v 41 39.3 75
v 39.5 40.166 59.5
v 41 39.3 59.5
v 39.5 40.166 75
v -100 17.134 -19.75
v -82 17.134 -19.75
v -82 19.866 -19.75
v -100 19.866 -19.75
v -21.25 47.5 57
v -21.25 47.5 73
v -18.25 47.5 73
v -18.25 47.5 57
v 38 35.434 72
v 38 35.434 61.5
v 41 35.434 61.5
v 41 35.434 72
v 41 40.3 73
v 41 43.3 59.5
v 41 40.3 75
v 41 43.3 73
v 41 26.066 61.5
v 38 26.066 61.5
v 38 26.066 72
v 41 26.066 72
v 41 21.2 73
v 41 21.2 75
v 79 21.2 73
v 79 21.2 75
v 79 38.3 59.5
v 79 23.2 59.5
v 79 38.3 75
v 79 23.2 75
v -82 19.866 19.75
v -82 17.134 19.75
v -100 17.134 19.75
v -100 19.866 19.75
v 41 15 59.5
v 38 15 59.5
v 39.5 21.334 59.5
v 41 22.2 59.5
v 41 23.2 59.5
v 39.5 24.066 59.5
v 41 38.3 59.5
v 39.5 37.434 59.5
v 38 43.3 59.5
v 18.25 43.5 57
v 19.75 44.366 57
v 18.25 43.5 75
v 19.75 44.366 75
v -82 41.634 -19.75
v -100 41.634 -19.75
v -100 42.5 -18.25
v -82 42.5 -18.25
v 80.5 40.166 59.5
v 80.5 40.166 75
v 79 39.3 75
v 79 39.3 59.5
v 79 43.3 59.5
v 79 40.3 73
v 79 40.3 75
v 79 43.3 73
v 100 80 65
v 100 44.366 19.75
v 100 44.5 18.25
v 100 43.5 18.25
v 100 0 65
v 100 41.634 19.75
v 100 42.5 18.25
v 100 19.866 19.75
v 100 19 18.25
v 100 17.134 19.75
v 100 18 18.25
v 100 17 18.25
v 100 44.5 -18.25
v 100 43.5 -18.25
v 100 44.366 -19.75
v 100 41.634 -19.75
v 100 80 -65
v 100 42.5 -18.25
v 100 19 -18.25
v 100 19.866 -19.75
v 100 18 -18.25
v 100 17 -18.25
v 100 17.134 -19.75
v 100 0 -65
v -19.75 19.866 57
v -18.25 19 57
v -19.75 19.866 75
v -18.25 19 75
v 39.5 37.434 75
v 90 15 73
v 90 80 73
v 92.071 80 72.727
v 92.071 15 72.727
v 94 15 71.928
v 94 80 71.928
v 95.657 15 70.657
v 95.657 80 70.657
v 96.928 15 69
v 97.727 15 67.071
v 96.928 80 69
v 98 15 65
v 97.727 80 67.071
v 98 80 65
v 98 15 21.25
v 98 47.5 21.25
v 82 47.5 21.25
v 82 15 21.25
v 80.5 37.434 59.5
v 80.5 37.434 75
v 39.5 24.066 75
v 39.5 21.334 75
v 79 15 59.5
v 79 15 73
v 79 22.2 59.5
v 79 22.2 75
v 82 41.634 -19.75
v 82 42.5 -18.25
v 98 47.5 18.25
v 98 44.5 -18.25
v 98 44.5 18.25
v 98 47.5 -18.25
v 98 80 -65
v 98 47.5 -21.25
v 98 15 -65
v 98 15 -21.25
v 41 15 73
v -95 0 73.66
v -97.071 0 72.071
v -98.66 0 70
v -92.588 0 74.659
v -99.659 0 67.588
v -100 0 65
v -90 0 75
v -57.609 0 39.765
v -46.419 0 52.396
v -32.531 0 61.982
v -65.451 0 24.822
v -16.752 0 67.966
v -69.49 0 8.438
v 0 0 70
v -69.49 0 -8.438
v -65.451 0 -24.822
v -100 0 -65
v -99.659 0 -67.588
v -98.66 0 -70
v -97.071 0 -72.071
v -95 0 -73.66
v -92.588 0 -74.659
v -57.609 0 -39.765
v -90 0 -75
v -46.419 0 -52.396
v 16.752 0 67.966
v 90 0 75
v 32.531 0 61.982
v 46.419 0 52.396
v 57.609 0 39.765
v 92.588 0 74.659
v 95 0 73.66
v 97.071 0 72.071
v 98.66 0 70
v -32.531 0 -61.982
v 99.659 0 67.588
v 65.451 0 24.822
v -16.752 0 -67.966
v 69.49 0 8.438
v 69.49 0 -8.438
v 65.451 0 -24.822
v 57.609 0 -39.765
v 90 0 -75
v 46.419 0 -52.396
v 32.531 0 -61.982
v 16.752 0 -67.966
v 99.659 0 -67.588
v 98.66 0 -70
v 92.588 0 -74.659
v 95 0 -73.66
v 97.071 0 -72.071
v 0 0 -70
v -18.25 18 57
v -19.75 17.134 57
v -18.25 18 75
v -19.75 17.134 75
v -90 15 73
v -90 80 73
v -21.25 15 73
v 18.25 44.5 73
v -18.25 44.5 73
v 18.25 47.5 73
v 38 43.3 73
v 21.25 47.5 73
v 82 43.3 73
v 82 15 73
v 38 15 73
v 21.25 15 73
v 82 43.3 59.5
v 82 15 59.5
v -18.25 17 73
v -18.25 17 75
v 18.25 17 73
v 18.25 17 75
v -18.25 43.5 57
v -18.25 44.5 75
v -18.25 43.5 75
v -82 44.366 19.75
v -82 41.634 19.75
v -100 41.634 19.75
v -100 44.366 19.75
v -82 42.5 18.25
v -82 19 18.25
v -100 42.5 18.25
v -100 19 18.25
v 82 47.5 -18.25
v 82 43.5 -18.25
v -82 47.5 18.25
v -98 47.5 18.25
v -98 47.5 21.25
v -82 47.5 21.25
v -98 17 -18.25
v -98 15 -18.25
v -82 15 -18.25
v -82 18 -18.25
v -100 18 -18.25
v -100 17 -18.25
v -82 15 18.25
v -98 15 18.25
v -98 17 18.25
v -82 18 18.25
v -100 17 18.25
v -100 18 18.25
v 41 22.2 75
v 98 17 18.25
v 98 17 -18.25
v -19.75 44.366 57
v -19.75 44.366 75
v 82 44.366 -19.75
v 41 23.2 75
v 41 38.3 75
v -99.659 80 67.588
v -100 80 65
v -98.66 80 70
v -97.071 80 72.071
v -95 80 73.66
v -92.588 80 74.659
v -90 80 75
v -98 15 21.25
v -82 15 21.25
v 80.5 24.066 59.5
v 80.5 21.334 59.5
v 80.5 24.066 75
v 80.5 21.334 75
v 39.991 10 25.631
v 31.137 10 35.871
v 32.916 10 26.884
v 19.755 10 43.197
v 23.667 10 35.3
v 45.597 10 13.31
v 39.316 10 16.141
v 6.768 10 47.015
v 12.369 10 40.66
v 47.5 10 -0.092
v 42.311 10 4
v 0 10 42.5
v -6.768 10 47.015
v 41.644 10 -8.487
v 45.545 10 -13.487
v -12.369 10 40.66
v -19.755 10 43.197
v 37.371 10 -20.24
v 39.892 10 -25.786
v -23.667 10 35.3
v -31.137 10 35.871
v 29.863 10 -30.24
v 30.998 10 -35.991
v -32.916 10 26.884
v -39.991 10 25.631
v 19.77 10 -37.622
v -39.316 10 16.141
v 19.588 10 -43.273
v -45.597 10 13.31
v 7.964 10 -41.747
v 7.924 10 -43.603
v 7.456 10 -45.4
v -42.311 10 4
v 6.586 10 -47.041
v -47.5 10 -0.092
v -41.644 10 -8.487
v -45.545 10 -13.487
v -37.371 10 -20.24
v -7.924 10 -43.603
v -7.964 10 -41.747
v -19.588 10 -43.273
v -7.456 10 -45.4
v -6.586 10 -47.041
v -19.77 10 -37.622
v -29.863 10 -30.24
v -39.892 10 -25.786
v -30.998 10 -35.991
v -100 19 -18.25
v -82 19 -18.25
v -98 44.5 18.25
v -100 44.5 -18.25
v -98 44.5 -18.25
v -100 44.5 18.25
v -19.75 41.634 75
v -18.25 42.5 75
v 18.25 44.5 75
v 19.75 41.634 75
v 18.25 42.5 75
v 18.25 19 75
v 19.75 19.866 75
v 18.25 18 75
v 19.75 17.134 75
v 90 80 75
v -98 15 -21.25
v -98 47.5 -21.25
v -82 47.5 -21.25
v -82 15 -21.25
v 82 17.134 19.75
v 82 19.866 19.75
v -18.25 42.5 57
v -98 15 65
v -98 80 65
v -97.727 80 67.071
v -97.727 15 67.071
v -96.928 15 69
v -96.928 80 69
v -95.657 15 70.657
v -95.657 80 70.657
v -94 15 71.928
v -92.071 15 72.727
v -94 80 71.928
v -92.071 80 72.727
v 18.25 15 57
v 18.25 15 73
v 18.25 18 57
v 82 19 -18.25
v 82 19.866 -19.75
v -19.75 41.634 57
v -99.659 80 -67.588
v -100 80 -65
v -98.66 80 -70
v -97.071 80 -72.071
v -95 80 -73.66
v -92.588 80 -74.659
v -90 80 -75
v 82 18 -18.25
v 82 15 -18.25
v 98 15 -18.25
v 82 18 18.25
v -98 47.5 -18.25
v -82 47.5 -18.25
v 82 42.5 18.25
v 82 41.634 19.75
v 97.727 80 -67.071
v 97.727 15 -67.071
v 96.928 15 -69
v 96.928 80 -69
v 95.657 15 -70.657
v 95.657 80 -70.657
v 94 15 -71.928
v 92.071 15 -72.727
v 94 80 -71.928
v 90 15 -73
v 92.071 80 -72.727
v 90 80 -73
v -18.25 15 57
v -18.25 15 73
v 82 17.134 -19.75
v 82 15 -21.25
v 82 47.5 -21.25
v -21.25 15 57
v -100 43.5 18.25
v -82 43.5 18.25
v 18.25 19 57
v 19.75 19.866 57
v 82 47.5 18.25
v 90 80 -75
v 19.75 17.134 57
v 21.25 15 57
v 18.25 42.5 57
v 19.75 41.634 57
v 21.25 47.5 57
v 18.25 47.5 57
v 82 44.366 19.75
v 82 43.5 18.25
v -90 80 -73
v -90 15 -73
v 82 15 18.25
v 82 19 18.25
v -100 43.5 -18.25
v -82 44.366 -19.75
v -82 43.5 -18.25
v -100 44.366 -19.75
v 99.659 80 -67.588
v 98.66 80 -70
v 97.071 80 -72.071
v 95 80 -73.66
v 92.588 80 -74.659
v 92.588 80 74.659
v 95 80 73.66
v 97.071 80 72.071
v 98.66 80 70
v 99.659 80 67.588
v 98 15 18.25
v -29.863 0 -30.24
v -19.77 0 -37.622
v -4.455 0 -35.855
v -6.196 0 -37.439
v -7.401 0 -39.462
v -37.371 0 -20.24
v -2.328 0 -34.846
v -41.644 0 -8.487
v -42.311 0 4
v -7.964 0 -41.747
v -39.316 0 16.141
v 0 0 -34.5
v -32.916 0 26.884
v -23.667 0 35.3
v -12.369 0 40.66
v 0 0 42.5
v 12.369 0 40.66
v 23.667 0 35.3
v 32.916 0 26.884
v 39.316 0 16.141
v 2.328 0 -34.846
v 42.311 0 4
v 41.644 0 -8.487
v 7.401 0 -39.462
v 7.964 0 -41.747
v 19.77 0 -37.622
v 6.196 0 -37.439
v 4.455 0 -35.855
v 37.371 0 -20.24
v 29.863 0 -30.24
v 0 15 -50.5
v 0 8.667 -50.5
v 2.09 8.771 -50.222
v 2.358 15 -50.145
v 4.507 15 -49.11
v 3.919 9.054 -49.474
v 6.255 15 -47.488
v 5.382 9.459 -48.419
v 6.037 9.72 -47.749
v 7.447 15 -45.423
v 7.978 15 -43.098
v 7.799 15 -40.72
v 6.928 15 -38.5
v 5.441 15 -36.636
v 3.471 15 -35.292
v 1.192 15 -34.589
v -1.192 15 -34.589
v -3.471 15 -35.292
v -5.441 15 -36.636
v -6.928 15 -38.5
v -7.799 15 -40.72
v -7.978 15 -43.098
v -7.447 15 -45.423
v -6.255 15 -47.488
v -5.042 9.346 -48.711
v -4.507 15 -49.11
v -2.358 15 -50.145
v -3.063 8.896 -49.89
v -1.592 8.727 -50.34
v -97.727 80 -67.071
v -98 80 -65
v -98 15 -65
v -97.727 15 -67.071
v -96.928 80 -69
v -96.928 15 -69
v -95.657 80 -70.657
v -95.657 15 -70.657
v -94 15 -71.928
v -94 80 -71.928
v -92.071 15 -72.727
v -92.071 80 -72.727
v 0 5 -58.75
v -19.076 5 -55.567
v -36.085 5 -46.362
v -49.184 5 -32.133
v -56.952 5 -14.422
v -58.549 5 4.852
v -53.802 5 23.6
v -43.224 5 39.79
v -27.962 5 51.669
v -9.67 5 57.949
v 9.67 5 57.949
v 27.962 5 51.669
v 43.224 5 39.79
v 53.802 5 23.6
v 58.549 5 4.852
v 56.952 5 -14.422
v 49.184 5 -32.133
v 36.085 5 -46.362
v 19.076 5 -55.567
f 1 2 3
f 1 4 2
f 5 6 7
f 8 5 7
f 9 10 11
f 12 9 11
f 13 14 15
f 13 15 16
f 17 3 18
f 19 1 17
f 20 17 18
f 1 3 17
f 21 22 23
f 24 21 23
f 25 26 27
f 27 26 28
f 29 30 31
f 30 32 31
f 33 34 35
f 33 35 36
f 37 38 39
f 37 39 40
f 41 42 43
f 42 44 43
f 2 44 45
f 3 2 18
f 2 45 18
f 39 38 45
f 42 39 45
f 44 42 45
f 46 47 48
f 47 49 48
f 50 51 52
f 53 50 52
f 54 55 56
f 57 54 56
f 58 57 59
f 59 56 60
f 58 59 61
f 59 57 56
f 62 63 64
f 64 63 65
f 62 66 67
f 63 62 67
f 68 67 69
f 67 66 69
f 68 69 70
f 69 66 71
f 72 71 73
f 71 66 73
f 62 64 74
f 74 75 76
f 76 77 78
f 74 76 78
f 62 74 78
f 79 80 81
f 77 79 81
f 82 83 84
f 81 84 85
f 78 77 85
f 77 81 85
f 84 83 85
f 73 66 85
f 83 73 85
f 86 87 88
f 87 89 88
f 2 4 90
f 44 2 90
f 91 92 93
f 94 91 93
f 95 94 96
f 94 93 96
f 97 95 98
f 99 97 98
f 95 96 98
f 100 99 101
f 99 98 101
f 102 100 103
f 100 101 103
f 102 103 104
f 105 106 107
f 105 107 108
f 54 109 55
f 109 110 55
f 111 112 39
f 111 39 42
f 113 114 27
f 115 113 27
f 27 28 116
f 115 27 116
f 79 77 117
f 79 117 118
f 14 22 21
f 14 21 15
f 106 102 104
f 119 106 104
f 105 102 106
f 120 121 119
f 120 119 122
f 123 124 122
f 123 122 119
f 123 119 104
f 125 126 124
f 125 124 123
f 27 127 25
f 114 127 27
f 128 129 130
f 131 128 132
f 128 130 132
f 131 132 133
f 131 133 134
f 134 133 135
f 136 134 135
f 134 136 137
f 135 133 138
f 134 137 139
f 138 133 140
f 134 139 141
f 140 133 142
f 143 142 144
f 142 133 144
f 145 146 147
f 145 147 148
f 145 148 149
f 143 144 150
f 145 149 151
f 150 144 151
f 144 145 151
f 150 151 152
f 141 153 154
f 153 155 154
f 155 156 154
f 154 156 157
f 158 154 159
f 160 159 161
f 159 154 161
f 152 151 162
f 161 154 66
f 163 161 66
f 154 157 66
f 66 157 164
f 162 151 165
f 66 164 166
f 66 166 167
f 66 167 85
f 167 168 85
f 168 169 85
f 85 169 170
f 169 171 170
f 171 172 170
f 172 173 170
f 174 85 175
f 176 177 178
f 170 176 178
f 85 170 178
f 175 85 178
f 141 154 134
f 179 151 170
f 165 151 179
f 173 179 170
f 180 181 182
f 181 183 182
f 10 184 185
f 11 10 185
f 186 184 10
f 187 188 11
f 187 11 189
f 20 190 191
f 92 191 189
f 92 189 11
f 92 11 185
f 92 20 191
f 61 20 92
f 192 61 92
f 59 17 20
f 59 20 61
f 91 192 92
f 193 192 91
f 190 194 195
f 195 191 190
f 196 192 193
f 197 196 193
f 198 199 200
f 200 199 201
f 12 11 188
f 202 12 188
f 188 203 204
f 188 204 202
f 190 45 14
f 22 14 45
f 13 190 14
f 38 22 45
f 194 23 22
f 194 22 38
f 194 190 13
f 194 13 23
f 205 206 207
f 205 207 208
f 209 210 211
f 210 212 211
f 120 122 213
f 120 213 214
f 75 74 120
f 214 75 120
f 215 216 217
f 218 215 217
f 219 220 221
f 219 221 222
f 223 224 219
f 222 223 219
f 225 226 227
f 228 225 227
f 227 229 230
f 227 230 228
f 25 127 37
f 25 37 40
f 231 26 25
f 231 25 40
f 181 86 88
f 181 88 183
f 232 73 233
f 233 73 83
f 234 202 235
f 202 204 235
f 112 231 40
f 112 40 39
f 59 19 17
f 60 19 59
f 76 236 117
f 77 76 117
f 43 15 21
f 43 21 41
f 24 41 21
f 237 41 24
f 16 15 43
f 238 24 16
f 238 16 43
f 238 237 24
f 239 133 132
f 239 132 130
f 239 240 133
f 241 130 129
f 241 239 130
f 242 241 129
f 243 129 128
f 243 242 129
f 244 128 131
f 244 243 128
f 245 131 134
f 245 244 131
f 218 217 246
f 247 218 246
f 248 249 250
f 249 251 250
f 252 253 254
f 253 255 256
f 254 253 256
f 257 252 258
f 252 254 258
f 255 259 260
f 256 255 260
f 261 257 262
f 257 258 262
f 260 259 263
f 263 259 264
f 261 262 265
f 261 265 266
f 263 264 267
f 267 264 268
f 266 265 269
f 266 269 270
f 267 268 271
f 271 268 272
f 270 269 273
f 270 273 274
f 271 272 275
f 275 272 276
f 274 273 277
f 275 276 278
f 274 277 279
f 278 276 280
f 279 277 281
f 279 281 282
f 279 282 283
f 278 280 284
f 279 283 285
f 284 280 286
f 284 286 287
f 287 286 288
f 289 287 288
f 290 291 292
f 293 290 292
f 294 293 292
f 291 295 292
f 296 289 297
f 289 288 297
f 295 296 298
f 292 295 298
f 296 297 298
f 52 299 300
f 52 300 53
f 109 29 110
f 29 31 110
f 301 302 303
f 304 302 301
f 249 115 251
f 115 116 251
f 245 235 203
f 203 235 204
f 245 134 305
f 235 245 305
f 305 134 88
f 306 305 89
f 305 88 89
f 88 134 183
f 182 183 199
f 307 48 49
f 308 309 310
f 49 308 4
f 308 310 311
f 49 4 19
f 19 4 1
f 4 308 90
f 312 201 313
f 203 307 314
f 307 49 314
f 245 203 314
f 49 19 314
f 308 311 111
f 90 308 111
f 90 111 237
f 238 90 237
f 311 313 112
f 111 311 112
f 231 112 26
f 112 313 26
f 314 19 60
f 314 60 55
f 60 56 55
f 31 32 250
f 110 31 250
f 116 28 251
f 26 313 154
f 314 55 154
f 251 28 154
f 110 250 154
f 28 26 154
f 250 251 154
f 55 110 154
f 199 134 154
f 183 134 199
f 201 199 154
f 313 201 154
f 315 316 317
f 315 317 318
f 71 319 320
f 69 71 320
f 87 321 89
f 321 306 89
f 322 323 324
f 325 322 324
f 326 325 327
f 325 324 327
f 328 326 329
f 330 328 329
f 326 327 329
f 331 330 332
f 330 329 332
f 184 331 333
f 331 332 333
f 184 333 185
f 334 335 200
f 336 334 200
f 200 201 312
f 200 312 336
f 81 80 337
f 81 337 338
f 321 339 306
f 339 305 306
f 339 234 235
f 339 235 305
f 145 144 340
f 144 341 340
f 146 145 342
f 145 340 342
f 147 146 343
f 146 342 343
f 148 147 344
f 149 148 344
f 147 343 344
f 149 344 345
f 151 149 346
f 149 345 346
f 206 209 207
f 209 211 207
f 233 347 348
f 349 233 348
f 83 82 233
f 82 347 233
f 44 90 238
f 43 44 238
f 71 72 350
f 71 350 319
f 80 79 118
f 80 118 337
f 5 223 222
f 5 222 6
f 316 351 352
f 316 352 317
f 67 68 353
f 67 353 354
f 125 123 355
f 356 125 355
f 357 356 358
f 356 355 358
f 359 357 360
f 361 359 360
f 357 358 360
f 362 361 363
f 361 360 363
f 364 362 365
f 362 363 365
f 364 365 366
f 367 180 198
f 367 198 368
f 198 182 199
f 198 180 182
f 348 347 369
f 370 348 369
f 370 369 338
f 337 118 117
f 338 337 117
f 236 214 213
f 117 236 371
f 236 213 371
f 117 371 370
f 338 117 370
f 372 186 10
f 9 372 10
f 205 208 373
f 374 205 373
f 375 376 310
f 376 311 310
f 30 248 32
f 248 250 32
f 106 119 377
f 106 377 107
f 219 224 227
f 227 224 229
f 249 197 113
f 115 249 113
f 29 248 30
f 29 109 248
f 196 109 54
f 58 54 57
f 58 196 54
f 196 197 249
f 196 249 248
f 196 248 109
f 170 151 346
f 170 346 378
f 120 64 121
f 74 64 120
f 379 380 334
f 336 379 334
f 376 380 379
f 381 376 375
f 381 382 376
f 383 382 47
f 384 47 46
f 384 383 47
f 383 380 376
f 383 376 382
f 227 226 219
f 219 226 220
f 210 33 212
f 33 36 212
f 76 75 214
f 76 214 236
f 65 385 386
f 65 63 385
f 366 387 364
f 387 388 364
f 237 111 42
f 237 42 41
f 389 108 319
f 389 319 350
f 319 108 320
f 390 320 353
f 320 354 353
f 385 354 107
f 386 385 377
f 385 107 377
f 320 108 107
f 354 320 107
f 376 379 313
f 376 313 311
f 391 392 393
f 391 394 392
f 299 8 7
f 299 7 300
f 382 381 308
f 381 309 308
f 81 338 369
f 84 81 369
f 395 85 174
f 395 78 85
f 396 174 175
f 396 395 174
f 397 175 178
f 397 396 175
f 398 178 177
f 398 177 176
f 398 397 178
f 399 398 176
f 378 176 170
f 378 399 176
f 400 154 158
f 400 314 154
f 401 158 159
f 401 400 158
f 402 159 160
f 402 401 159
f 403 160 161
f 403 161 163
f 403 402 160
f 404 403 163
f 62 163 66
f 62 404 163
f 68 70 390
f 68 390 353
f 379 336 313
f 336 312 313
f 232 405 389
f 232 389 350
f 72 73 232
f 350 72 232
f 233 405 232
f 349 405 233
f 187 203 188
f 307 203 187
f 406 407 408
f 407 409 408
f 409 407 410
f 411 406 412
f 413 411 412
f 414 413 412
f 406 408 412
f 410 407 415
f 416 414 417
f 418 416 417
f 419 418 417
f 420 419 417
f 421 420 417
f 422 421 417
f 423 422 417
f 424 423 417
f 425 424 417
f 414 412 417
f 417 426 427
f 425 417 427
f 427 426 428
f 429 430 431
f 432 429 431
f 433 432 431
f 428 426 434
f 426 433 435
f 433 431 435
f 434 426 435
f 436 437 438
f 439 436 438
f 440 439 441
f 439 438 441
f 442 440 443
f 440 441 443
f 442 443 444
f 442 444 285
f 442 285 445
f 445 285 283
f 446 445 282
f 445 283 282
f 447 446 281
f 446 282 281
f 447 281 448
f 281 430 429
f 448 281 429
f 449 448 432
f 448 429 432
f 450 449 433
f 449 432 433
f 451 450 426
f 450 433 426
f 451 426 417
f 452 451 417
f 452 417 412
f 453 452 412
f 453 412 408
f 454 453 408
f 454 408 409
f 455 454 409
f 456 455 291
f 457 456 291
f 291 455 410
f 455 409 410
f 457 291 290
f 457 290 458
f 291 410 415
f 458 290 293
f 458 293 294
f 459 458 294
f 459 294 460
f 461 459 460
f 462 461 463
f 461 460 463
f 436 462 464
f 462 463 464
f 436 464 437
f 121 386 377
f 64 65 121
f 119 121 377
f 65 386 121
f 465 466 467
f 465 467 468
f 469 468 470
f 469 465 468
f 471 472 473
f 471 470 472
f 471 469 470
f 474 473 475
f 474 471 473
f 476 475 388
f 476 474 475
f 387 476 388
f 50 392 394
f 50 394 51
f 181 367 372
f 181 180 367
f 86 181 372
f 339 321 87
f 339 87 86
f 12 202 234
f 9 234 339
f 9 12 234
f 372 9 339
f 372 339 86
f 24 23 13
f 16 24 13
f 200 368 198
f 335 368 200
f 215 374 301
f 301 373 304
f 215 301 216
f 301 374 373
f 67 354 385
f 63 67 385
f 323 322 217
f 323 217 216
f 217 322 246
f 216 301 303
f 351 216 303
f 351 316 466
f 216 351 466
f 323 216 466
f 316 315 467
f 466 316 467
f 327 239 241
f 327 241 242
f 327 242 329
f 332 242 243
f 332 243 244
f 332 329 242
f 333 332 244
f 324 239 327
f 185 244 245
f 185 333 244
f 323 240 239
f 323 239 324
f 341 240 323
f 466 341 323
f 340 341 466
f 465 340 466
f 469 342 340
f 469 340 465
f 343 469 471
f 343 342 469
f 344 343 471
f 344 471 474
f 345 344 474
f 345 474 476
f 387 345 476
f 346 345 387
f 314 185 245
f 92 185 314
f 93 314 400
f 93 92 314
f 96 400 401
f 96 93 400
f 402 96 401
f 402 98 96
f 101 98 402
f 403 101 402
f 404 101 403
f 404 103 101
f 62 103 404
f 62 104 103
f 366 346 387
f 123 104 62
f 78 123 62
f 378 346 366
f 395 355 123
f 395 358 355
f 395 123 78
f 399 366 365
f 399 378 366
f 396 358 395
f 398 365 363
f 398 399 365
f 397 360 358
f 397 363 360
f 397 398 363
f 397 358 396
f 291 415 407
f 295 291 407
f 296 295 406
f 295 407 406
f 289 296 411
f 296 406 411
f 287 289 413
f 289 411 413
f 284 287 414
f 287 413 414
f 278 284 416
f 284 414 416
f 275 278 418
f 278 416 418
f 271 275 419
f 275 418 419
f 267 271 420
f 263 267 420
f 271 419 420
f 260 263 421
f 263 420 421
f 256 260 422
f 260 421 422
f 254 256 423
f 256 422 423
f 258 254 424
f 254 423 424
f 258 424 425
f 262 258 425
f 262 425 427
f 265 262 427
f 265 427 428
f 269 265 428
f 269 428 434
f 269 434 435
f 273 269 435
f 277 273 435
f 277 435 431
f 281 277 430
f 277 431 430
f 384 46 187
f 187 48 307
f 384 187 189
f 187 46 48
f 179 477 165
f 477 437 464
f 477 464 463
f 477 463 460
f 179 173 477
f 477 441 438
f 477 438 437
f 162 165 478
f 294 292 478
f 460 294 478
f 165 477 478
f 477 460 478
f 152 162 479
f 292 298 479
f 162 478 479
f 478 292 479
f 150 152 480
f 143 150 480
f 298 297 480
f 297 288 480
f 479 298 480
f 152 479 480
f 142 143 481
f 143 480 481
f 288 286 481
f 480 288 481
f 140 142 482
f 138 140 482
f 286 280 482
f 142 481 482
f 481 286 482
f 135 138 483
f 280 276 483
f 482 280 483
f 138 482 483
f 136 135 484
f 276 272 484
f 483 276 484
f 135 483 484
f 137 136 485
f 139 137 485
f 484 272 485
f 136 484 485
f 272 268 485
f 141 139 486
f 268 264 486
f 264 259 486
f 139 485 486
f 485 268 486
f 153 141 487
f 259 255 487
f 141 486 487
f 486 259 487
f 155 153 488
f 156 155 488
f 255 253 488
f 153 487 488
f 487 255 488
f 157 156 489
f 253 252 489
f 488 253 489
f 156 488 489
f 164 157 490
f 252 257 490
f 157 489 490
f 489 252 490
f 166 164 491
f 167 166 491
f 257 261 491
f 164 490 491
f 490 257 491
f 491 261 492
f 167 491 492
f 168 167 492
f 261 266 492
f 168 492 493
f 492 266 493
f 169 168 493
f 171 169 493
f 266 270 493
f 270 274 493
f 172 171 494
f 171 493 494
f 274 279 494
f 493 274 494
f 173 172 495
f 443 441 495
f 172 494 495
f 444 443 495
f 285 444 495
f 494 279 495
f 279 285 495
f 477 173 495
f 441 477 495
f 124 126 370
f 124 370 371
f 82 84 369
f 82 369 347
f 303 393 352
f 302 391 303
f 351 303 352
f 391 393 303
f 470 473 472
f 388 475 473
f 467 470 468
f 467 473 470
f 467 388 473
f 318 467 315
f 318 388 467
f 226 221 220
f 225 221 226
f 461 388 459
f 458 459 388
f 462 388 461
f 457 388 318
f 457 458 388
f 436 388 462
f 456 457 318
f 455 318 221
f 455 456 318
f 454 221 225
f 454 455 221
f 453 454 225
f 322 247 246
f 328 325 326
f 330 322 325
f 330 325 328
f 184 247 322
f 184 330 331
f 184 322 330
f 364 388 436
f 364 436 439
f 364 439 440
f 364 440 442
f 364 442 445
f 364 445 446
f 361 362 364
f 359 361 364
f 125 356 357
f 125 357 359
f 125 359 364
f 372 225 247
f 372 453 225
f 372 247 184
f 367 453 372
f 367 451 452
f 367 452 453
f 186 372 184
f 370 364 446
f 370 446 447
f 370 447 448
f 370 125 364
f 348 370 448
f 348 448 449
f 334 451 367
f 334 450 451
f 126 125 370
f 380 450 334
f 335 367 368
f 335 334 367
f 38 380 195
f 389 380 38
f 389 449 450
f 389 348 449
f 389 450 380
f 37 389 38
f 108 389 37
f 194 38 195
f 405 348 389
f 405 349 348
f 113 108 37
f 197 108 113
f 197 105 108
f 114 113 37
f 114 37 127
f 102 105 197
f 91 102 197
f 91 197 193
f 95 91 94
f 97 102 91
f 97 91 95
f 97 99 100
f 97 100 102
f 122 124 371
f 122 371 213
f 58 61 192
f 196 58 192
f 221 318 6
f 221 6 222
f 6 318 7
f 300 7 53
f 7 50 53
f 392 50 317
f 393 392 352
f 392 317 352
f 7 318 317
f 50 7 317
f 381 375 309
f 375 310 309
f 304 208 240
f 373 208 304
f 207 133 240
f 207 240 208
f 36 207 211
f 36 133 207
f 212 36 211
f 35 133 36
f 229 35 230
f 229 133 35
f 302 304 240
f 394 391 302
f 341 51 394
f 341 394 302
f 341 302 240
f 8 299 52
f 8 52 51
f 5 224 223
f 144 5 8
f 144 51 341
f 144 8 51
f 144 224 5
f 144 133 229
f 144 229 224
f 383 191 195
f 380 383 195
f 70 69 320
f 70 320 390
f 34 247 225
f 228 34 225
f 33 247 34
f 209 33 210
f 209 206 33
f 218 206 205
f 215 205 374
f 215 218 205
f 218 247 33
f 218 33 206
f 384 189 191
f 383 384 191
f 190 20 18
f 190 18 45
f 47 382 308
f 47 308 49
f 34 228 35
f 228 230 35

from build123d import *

# Parameters (mm, degrees)
SKETCH2_W                = 200
SKETCH2_H                = 150
BOSS_EXTRUDE1_DEPTH      = 80
FILLET1_R                = 10
SHELL1_T                 = -2
SHELL1_THICKNESS_2_DEPTH = 13
SKETCH5_W                = 36.5
SKETCH5_H                = 27.5
CUT_EXTRUDE1_DEPTH       = 2
BOSS_EXTRUDE2_DEPTH      = 16
SKETCH7_W                = 36.5
SKETCH7_H                = 27.5
CUT_EXTRUDE2_DEPTH       = 2
BOSS_EXTRUDE3_DEPTH      = 16
SKETCH10_W               = 36.5
SKETCH10_H               = 27.5
CUT_EXTRUDE4_DEPTH       = 2
BOSS_EXTRUDE4_DEPTH      = 16
SKETCH13_W               = 38
SKETCH13_H               = 19.1
CUT_EXTRUDE5_DEPTH       = 2
BOSS_EXTRUDE5_DEPTH      = 13.5
SKETCH15_W               = 10.5
SKETCH15_H               = 9.367949192
CUT_EXTRUDE6_DEPTH       = 3
CUT_EXTRUDE8_REACH       = 150.408
SKETCH20_R               = 8


with BuildPart() as part:
    # Sketch2 → Boss-Extrude1 (new body)
    with BuildSketch(Plane(origin=(0, 0, 0), x_dir=(1, 0, 0), z_dir=(0, 1, 0))):
        Rectangle(SKETCH2_W, SKETCH2_H)
    extrude(amount=BOSS_EXTRUDE1_DEPTH)

    # Fillet1
    fillet1_edges = [part.edges().sort_by_distance(p)[0] for p in [
        (100, 40, 75),
        (-100, 40, 75),
        (-100, 40, -75),
        (100, 40, -75),
    ]]
    fillet(fillet1_edges, radius=FILLET1_R)

    # Shell1
    shell1_openings = [part.faces().sort_by_distance(p)[0] for p in [
        (0, 80, 0),
    ]]
    offset(amount=SHELL1_T, openings=shell1_openings, kind=Kind.INTERSECTION)

    # Shell1 thickness 2 face (on inner face of the shell) → Shell1 thickness 2 (add)
    with BuildSketch(Plane(origin=(0, 2, 0), x_dir=(0, 0, -1), z_dir=(0, -1, 0))):
        with BuildLine():
            ThreePointArc((73, -90), (70.656854249, -95.656854249), (65, -98))
            Line((65, -98), (-65, -98))
            ThreePointArc((-65, -98), (-70.656854249, -95.656854249), (-73, -90))
            Line((-73, -90), (-73, 90))
            ThreePointArc((-73, 90), (-70.656854249, 95.656854249), (-65, 98))
            Line((-65, 98), (65, 98))
            ThreePointArc((65, 98), (70.656854249, 95.656854249), (73, 90))
            Line((73, 90), (73, -90))
        make_face()
    extrude(amount=-SHELL1_THICKNESS_2_DEPTH)

    # Sketch5 → Cut-Extrude1 (cut)
    with BuildSketch(Plane.XY.offset(75)):
        with Locations((0, 30.75)):
            Rectangle(SKETCH5_W, SKETCH5_H)
        Polygon((-18.25, 43.5), (-19.75, 44.366025404), (-19.75, 41.633974596), (-18.25, 42.5), align=None)
        Polygon((-19.75, 19.866025404), (-18.25, 19), (-18.25, 18), (-19.75, 17.133974596), align=None)
        Polygon((19.75, 17.133974596), (19.75, 19.866025404), (18.25, 19), (18.25, 18), align=None)
        Polygon((19.75, 41.633974596), (18.25, 42.5), (18.25, 43.5), (19.75, 44.366025404), align=None)
    extrude(amount=-CUT_EXTRUDE1_DEPTH, mode=Mode.SUBTRACT)

    # Sketch6 → Boss-Extrude2 (add)
    with BuildSketch(Plane(origin=(0, 0, 73), x_dir=(-1, 0, 0), z_dir=(0, 0, -1))):
        Polygon((18.25, 15), (21.25, 15), (21.25, 47.5), (18.25, 47.5), (18.25, 43.5), (19.75, 44.366025404), (19.75, 41.633974596), (18.25, 42.5), (18.25, 19), (19.75, 19.866025404), (19.75, 17.133974596), (18.25, 18), align=None)
        Polygon((-21.25, 47.5), (-21.25, 15), (-18.25, 15), (-18.25, 18), (-19.75, 17.133974596), (-19.75, 19.866025404), (-18.25, 19), (-18.25, 42.5), (-19.75, 41.633974596), (-19.75, 44.366025404), (-18.25, 43.5), (-18.25, 47.5), align=None)
    extrude(amount=BOSS_EXTRUDE2_DEPTH)

    # Sketch7 → Cut-Extrude2 (cut)
    with BuildSketch(Plane(origin=(100, 0, 0), x_dir=(0, 0, -1), z_dir=(1, 0, 0))):
        with Locations((0, 30.75)):
            Rectangle(SKETCH7_W, SKETCH7_H)
        Polygon((-18.25, 43.5), (-19.75, 44.366025404), (-19.75, 41.633974596), (-18.25, 42.5), align=None)
        Polygon((-19.75, 19.866025404), (-18.25, 19), (-18.25, 18), (-19.75, 17.133974596), align=None)
        Polygon((19.75, 17.133974596), (19.75, 19.866025404), (18.25, 19), (18.25, 18), align=None)
        Polygon((19.75, 41.633974596), (18.25, 42.5), (18.25, 43.5), (19.75, 44.366025404), align=None)
    extrude(amount=-CUT_EXTRUDE2_DEPTH, mode=Mode.SUBTRACT)

    # Sketch8 → Boss-Extrude3 (add)
    with BuildSketch(Plane.ZY.offset(-98)):
        Polygon((-21.25, 47.5), (-18.25, 47.5), (-18.25, 43.5), (-19.75, 44.366025404), (-19.75, 41.633974596), (-18.25, 42.5), (-18.25, 19), (-19.75, 19.866025404), (-19.75, 17.133974596), (-18.25, 18), (-18.25, 15), (-21.25, 15), align=None)
        Polygon((19.75, 44.366025404), (18.25, 43.5), (18.25, 47.5), (21.25, 47.5), (21.25, 15), (18.25, 15), (18.25, 18), (19.75, 17.133974596), (19.75, 19.866025404), (18.25, 19), (18.25, 42.5), (19.75, 41.633974596), align=None)
    extrude(amount=BOSS_EXTRUDE3_DEPTH)

    # Sketch10 → Cut-Extrude4 (cut)
    with BuildSketch(Plane.ZY.offset(100)):
        with Locations((0, 30.75)):
            Rectangle(SKETCH10_W, SKETCH10_H)
        Polygon((-18.25, 43.5), (-19.75, 44.366025404), (-19.75, 41.633974596), (-18.25, 42.5), align=None)
        Polygon((-19.75, 19.866025404), (-18.25, 19), (-18.25, 18), (-19.75, 17.133974596), align=None)
        Polygon((19.75, 17.133974596), (19.75, 19.866025404), (18.25, 19), (18.25, 18), align=None)
        Polygon((19.75, 41.633974596), (18.25, 42.5), (18.25, 43.5), (19.75, 44.366025404), align=None)
    extrude(amount=-CUT_EXTRUDE4_DEPTH, mode=Mode.SUBTRACT)

    # Sketch11 → Boss-Extrude4 (add)
    with BuildSketch(Plane(origin=(-98, 0, 0), x_dir=(0, 0, -1), z_dir=(1, 0, 0))):
        Polygon((-18.25, 47.5), (-21.25, 47.5), (-21.25, 15), (-18.25, 15), (-18.25, 18), (-19.75, 17.133974596), (-19.75, 19.866025404), (-18.25, 19), (-18.25, 42.5), (-19.75, 41.633974596), (-19.75, 44.366025404), (-18.25, 43.5), align=None)
        Polygon((19.75, 44.366025404), (18.25, 43.5), (18.25, 47.5), (21.25, 47.5), (21.25, 15), (18.25, 15), (18.25, 18), (19.75, 17.133974596), (19.75, 19.866025404), (18.25, 19), (18.25, 42.5), (19.75, 41.633974596), align=None)
    extrude(amount=BOSS_EXTRUDE4_DEPTH)

    # Sketch13 → Cut-Extrude5 (cut)
    with BuildSketch(Plane.XY.offset(75)):
        Polygon((41, 39.3), (39.5, 40.166025404), (39.5, 37.433974596), (41, 38.3), align=None)
        with Locations((60, 30.75)):
            Rectangle(SKETCH13_W, SKETCH13_H)
        Polygon((41, 22.2), (39.5, 21.333974596), (39.5, 24.066025404), (41, 23.2), align=None)
        Polygon((79, 22.2), (79, 23.2), (80.5, 24.066025404), (80.5, 21.333974596), align=None)
        Polygon((79, 39.3), (80.5, 40.166025404), (80.5, 37.433974596), (79, 38.3), align=None)
    extrude(amount=-CUT_EXTRUDE5_DEPTH, mode=Mode.SUBTRACT)

    # Sketch14 → Boss-Extrude5 (add)
    with BuildSketch(Plane(origin=(0, 0, 73), x_dir=(-1, 0, 0), z_dir=(0, 0, -1))):
        Polygon((-79, 43.3), (-82, 43.3), (-82, 15), (-79, 15), (-79, 22.2), (-80.5, 21.333974596), (-80.5, 24.066025404), (-79, 23.2), (-79, 38.3), (-80.5, 37.433974596), (-80.5, 40.166025404), (-79, 39.3), align=None)
        Polygon((-39.5, 40.166025404), (-41, 39.3), (-41, 43.3), (-38, 43.3), (-38, 15), (-41, 15), (-41, 22.2), (-39.5, 21.333974596), (-39.5, 24.066025404), (-41, 23.2), (-41, 38.3), (-39.5, 37.433974596), align=None)
    extrude(amount=BOSS_EXTRUDE5_DEPTH)

    # Sketch15 → Cut-Extrude6 (cut)
    with BuildSketch(Plane.ZY.offset(-38)):
        with Locations((66.75, 30.75)):
            Rectangle(SKETCH15_W, SKETCH15_H)
    extrude(amount=-CUT_EXTRUDE6_DEPTH, mode=Mode.SUBTRACT)

    # Sketch18 → Cut-Revolve1 (revolve, cut)
    with BuildSketch(Plane(origin=(0, 0, 0), x_dir=(0, 0, -1), z_dir=(1, 0, 0)), mode=Mode.PRIVATE) as cut_revolve1_sk:
        Polygon((-42.5, 0), (-70, 0), (-47.5, 10), (-42.5, 10), align=None)
    revolve(cut_revolve1_sk.sketch.rotate(Axis((0, 0, 0), (0, 1, 0)), 180), axis=Axis((0, 0, 0), (0, 1, 0)), mode=Mode.SUBTRACT)

    # Cut-Extrude8: up to this face of the body (flat: up to its plane)
    cut_extrude8_end = Plane(part.part.faces().sort_by_distance((-0.172388952, 15, -0.411685035))[0])
    # Sketch20 → Cut-Extrude8 (cut, up to the picked face)
    with BuildSketch(Plane.XZ, mode=Mode.PRIVATE) as cut_extrude8_sk1:
        with Locations(Location((0, -42.5, 0), (0, 0, 270))):
            Circle(SKETCH20_R)
    cut_extrude8_tool1 = split(extrude(cut_extrude8_sk1.sketch, amount=-CUT_EXTRUDE8_REACH, mode=Mode.PRIVATE), bisect_by=cut_extrude8_end, keep=Keep.BOTH, mode=Mode.PRIVATE)
    add(cut_extrude8_tool1.solids().sort_by(Axis((0, 0, -42.5), (0, 1, 0)))[0], mode=Mode.SUBTRACT)


solid = part.part
